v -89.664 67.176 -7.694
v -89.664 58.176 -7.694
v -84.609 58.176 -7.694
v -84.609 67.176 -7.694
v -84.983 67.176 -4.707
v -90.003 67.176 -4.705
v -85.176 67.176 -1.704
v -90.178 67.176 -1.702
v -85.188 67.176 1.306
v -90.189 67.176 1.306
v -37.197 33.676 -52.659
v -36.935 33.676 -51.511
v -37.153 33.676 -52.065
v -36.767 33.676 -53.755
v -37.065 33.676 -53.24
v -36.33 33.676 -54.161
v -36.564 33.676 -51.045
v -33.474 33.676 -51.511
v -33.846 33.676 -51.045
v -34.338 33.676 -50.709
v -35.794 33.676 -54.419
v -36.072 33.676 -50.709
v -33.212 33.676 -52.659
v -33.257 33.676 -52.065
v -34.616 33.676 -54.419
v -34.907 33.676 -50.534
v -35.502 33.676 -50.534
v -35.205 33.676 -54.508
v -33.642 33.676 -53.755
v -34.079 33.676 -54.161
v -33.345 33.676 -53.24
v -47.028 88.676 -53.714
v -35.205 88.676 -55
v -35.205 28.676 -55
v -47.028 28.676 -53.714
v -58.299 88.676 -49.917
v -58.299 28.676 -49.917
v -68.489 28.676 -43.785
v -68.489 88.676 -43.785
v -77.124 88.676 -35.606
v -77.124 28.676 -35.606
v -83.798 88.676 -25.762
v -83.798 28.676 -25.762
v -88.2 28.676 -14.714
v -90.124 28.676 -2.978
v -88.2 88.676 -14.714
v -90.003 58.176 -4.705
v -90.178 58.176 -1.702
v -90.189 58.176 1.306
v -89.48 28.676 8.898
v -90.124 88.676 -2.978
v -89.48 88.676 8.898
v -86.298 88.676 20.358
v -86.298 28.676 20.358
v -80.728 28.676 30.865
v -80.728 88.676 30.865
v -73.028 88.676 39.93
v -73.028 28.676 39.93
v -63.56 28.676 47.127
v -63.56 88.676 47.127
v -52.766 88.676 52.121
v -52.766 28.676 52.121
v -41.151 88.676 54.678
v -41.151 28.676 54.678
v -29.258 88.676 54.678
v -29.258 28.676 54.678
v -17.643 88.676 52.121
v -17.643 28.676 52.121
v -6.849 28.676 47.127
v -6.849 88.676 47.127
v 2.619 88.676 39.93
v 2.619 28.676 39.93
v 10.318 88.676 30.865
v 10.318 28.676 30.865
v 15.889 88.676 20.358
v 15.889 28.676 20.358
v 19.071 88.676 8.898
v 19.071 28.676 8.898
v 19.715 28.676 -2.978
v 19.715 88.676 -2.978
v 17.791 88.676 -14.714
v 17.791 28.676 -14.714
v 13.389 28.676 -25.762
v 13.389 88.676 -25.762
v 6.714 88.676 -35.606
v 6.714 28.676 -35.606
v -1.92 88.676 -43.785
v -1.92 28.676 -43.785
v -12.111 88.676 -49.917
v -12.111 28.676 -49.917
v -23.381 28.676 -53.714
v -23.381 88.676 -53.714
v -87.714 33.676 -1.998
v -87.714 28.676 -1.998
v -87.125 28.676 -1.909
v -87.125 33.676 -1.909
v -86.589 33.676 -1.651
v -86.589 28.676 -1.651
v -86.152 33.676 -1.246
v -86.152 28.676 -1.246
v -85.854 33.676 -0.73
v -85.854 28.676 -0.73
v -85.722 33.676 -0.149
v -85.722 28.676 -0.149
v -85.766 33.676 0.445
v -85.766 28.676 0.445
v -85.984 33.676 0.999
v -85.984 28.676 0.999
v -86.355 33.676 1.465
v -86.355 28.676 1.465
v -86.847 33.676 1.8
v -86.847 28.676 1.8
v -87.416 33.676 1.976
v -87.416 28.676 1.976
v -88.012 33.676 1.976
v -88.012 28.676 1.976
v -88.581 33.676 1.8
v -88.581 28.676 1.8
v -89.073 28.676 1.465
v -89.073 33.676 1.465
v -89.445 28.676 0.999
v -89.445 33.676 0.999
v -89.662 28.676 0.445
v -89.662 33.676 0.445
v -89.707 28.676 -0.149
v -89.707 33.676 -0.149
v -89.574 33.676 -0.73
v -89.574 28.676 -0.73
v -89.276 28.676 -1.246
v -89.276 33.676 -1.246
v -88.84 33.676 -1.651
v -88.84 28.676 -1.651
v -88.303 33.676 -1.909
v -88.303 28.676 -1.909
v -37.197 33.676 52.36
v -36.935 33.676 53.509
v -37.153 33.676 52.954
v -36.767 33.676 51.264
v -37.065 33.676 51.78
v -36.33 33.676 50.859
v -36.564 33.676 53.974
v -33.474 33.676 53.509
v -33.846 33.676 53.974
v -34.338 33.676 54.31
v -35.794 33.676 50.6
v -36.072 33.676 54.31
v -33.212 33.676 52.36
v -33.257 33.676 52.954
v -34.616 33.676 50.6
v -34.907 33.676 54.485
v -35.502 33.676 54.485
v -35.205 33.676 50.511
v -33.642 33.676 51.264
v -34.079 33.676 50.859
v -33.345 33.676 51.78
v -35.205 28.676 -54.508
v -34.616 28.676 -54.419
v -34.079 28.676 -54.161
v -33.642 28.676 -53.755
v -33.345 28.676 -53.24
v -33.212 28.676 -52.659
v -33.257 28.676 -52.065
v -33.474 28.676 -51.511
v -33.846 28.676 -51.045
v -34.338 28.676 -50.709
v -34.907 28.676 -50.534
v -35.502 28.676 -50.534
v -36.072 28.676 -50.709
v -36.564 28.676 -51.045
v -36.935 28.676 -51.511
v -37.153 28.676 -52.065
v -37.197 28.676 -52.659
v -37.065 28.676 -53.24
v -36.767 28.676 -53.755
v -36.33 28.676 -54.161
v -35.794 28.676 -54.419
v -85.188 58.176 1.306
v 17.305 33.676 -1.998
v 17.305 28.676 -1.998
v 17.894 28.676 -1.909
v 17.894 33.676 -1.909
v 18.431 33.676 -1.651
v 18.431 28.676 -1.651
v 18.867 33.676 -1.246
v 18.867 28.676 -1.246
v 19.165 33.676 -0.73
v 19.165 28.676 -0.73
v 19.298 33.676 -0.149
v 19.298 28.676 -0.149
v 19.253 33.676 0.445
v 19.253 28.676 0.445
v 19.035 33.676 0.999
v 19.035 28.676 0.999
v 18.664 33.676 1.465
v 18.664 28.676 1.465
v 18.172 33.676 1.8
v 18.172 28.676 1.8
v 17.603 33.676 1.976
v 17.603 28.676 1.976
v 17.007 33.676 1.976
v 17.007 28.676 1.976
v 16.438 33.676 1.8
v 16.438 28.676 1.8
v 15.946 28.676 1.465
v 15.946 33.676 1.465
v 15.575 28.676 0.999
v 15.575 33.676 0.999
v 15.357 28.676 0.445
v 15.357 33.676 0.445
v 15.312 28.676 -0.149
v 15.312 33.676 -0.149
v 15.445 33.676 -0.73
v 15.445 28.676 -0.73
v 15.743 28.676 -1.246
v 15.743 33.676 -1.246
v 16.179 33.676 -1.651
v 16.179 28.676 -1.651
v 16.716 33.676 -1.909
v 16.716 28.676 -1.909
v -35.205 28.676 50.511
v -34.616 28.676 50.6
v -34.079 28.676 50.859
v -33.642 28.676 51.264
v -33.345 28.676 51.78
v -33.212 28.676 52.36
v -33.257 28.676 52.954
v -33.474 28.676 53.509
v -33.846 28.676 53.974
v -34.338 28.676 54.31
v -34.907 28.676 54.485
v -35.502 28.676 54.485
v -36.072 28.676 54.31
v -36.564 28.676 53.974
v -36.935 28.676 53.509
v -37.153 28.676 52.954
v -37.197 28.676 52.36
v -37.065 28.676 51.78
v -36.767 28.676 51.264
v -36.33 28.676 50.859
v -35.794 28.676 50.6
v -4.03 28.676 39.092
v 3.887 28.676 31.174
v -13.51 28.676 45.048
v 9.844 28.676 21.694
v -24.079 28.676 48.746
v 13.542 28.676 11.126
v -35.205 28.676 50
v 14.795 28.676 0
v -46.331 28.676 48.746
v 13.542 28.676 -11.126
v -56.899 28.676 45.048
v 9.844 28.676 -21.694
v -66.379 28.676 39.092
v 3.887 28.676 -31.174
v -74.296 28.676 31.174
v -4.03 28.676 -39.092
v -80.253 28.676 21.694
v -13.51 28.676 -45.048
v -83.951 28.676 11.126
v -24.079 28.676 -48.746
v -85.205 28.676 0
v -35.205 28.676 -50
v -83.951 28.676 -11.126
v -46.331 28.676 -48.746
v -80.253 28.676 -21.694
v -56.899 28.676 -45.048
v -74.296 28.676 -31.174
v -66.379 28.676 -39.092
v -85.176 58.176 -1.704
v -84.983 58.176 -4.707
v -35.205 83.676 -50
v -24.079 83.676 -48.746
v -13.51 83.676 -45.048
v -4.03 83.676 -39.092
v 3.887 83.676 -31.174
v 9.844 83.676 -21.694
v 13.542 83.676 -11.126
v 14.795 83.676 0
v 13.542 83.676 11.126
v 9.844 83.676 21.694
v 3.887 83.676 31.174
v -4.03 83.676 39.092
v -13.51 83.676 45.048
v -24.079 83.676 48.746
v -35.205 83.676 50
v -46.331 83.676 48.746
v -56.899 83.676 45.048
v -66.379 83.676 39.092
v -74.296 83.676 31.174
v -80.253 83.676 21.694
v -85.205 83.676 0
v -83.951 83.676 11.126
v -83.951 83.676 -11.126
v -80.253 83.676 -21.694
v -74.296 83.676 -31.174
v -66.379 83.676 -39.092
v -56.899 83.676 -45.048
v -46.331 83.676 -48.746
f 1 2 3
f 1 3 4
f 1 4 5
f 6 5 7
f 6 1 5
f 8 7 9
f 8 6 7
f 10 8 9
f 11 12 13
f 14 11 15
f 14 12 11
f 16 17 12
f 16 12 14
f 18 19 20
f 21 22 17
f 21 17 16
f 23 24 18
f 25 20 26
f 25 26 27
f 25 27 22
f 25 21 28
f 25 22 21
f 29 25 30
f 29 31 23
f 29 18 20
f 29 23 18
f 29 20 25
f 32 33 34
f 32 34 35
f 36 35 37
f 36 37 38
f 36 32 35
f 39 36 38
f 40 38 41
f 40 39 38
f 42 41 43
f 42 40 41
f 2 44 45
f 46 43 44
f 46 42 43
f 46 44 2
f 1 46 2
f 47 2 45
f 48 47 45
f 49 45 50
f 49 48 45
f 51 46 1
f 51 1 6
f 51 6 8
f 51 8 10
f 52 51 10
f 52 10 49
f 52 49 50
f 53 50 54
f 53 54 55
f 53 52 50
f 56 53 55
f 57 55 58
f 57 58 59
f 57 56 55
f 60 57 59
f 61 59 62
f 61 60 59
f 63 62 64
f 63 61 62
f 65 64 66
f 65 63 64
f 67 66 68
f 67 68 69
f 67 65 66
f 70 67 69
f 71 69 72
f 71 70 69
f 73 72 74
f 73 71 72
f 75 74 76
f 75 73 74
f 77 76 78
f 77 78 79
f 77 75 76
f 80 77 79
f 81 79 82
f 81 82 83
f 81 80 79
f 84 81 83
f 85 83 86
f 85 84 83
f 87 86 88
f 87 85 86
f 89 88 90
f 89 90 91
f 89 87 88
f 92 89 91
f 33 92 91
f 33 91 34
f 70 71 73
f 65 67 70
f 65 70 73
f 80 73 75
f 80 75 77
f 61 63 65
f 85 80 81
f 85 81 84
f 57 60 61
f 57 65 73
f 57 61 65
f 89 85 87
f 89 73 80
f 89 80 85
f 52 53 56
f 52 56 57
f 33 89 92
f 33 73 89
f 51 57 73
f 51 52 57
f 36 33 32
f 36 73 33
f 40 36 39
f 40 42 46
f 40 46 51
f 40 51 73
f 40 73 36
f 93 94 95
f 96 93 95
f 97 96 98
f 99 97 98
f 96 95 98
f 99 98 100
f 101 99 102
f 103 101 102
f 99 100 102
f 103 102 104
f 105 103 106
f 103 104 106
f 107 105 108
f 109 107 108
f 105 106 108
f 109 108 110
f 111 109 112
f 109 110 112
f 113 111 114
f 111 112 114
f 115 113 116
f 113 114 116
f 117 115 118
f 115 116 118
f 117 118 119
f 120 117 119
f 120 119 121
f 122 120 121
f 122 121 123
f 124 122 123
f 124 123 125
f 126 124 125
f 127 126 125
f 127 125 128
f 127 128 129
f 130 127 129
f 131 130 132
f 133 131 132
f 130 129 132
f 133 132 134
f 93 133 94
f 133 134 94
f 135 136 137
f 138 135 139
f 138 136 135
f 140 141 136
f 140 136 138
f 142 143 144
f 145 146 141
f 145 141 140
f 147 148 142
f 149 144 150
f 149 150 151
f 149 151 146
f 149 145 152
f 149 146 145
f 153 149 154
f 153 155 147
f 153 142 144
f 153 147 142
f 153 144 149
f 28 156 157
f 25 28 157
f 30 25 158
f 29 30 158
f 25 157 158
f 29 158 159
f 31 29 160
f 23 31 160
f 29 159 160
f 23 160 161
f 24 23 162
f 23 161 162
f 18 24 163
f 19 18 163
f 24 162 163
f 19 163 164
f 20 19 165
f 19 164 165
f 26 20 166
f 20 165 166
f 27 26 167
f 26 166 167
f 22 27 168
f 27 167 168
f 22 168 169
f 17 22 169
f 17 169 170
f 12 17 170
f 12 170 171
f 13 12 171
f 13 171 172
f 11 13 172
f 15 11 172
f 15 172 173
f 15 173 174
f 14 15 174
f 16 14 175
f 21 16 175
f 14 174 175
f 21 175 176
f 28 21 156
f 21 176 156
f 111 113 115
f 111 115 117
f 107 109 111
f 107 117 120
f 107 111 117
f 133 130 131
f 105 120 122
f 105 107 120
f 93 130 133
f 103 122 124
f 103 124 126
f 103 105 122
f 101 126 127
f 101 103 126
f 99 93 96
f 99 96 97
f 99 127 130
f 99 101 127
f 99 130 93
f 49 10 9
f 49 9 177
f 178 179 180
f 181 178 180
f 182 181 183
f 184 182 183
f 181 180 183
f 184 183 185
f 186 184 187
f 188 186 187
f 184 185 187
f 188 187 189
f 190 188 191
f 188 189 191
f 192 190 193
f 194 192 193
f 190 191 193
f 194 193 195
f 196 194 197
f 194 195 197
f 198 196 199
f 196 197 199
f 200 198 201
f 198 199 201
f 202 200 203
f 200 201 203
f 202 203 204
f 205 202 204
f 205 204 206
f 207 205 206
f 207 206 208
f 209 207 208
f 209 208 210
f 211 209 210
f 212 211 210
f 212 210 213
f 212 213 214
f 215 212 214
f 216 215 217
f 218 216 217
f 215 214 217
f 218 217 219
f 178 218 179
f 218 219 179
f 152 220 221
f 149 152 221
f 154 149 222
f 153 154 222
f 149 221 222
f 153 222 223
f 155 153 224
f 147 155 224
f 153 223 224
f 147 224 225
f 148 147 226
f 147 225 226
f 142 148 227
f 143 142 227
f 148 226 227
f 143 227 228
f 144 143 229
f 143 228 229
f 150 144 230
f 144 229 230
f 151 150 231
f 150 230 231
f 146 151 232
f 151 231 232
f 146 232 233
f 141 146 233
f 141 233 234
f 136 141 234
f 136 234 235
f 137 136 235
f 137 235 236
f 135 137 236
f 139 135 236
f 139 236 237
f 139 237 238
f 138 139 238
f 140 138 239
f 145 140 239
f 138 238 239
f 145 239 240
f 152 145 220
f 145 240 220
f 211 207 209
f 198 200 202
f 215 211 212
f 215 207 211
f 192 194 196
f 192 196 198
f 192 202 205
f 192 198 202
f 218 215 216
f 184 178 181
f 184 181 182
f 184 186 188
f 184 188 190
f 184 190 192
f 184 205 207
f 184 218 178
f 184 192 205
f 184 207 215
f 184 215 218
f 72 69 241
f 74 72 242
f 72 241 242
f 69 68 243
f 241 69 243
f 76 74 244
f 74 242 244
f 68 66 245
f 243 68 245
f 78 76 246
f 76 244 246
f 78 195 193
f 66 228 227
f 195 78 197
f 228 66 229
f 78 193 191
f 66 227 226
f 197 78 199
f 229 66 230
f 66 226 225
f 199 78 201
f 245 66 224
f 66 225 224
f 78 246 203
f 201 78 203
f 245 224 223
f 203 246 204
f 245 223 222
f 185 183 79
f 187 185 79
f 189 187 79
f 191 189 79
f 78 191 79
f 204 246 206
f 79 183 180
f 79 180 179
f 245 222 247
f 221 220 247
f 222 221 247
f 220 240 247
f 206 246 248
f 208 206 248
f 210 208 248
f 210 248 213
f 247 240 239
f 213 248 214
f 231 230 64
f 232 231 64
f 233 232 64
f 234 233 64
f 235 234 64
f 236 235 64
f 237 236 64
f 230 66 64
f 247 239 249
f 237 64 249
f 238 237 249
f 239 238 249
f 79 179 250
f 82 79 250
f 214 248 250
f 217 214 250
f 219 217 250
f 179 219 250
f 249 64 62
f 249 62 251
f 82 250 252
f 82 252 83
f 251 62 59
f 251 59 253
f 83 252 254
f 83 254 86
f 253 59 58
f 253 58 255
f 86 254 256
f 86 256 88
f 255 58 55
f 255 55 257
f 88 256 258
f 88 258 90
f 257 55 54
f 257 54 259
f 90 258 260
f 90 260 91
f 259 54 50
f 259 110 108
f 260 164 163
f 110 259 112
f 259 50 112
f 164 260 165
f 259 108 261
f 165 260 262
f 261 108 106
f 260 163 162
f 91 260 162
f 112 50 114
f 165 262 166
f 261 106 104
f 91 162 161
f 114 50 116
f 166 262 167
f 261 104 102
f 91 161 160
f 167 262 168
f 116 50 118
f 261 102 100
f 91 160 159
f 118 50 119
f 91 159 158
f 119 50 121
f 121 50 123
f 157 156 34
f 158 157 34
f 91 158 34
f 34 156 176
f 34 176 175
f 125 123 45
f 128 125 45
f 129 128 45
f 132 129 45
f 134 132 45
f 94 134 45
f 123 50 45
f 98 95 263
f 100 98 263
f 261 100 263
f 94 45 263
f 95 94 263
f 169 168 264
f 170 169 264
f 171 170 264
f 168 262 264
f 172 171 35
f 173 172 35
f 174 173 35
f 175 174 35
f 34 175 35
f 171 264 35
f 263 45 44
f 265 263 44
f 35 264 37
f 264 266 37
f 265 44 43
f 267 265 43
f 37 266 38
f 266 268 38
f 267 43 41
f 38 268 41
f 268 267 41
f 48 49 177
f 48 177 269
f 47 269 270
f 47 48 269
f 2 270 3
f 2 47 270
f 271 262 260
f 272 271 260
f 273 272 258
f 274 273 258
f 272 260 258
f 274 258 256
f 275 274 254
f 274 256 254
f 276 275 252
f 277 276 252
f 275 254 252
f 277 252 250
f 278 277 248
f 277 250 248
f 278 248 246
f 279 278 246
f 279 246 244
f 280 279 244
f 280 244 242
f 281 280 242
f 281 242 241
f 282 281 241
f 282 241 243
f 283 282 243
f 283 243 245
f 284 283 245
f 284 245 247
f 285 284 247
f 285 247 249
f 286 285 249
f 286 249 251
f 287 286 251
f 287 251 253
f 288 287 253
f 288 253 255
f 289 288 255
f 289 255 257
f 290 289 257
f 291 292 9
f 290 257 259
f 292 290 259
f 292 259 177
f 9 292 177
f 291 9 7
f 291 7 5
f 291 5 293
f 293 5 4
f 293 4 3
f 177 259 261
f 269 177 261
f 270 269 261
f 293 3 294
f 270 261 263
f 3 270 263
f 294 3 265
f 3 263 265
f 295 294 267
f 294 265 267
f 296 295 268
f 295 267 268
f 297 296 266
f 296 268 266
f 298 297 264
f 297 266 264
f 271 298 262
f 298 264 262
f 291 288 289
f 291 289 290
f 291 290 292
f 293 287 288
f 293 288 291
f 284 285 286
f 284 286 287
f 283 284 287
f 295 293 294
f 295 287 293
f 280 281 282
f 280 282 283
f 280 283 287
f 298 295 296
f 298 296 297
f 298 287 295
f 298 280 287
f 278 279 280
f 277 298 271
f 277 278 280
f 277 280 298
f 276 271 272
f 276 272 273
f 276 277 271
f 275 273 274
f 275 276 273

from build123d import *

# Parameters (mm, degrees)
SKETCH2_W          = 55
SKETCH2_H          = 60
SKETCH3_R          = 50
CUT_EXTRUDE1_DEPTH = 55
CUT_EXTRUDE2_DEPTH = 55
SKETCH6_R          = 1.998127765
CUT_EXTRUDE3_DEPTH = 5


with BuildPart() as part:
    # Sketch2 → Revolve1 (revolve)
    with BuildSketch(Plane.XY, mode=Mode.PRIVATE) as revolve1_sk:
        with Locations((-62.704631046, 58.675948718)):
            Rectangle(SKETCH2_W, SKETCH2_H)
    revolve(revolve1_sk.sketch.rotate(Axis((-35.204631046, 28.675948718, 0), (0, 1, 0)), 270), axis=Axis((-35.204631046, 28.675948718, 0), (0, 1, 0)))

    # Sketch3 → Cut-Extrude1 (cut)
    with BuildSketch(Plane.XZ.offset(-28.675948718)):
        with Locations(Location((-35.204631046, 0, 0), (0, 0, 270))):
            Circle(SKETCH3_R)
    extrude(amount=-CUT_EXTRUDE1_DEPTH, mode=Mode.SUBTRACT)

    # Sketch5 → Cut-Extrude2 (cut)
    with BuildSketch(Plane(origin=(-95, 0, 0), x_dir=(0, 0, -1), z_dir=(1, 0, 0))):
        Polygon((3.193764138, 58.175948718), (7.693764138, 58.175948718), (7.693764138, 67.175948718), (-1.306235862, 67.175948718), (-1.306235862, 58.175948718), align=None)
    extrude(amount=CUT_EXTRUDE2_DEPTH, mode=Mode.SUBTRACT)

    # Sketch6 → Cut-Extrude3 (cut)
    with BuildSketch(Plane(origin=(0, 28.675948718, 0), x_dir=(-1, 0, 0), z_dir=(0, -1, 0))):
        with Locations(Location((35.204631046, -52.509597986, 0), (0, 0, 90))):
            Circle(SKETCH6_R)
        with Locations(Location((-17.304966941, 0, 0), (0, 0, 90))):
            Circle(SKETCH6_R)
        with Locations(Location((35.204631046, 52.509597986, 0), (0, 0, 90))):
            Circle(SKETCH6_R)
        with Locations(Location((87.714229032, 0, 0), (0, 0, 90))):
            Circle(SKETCH6_R)
    extrude(amount=-CUT_EXTRUDE3_DEPTH, mode=Mode.SUBTRACT)


solid = part.part
